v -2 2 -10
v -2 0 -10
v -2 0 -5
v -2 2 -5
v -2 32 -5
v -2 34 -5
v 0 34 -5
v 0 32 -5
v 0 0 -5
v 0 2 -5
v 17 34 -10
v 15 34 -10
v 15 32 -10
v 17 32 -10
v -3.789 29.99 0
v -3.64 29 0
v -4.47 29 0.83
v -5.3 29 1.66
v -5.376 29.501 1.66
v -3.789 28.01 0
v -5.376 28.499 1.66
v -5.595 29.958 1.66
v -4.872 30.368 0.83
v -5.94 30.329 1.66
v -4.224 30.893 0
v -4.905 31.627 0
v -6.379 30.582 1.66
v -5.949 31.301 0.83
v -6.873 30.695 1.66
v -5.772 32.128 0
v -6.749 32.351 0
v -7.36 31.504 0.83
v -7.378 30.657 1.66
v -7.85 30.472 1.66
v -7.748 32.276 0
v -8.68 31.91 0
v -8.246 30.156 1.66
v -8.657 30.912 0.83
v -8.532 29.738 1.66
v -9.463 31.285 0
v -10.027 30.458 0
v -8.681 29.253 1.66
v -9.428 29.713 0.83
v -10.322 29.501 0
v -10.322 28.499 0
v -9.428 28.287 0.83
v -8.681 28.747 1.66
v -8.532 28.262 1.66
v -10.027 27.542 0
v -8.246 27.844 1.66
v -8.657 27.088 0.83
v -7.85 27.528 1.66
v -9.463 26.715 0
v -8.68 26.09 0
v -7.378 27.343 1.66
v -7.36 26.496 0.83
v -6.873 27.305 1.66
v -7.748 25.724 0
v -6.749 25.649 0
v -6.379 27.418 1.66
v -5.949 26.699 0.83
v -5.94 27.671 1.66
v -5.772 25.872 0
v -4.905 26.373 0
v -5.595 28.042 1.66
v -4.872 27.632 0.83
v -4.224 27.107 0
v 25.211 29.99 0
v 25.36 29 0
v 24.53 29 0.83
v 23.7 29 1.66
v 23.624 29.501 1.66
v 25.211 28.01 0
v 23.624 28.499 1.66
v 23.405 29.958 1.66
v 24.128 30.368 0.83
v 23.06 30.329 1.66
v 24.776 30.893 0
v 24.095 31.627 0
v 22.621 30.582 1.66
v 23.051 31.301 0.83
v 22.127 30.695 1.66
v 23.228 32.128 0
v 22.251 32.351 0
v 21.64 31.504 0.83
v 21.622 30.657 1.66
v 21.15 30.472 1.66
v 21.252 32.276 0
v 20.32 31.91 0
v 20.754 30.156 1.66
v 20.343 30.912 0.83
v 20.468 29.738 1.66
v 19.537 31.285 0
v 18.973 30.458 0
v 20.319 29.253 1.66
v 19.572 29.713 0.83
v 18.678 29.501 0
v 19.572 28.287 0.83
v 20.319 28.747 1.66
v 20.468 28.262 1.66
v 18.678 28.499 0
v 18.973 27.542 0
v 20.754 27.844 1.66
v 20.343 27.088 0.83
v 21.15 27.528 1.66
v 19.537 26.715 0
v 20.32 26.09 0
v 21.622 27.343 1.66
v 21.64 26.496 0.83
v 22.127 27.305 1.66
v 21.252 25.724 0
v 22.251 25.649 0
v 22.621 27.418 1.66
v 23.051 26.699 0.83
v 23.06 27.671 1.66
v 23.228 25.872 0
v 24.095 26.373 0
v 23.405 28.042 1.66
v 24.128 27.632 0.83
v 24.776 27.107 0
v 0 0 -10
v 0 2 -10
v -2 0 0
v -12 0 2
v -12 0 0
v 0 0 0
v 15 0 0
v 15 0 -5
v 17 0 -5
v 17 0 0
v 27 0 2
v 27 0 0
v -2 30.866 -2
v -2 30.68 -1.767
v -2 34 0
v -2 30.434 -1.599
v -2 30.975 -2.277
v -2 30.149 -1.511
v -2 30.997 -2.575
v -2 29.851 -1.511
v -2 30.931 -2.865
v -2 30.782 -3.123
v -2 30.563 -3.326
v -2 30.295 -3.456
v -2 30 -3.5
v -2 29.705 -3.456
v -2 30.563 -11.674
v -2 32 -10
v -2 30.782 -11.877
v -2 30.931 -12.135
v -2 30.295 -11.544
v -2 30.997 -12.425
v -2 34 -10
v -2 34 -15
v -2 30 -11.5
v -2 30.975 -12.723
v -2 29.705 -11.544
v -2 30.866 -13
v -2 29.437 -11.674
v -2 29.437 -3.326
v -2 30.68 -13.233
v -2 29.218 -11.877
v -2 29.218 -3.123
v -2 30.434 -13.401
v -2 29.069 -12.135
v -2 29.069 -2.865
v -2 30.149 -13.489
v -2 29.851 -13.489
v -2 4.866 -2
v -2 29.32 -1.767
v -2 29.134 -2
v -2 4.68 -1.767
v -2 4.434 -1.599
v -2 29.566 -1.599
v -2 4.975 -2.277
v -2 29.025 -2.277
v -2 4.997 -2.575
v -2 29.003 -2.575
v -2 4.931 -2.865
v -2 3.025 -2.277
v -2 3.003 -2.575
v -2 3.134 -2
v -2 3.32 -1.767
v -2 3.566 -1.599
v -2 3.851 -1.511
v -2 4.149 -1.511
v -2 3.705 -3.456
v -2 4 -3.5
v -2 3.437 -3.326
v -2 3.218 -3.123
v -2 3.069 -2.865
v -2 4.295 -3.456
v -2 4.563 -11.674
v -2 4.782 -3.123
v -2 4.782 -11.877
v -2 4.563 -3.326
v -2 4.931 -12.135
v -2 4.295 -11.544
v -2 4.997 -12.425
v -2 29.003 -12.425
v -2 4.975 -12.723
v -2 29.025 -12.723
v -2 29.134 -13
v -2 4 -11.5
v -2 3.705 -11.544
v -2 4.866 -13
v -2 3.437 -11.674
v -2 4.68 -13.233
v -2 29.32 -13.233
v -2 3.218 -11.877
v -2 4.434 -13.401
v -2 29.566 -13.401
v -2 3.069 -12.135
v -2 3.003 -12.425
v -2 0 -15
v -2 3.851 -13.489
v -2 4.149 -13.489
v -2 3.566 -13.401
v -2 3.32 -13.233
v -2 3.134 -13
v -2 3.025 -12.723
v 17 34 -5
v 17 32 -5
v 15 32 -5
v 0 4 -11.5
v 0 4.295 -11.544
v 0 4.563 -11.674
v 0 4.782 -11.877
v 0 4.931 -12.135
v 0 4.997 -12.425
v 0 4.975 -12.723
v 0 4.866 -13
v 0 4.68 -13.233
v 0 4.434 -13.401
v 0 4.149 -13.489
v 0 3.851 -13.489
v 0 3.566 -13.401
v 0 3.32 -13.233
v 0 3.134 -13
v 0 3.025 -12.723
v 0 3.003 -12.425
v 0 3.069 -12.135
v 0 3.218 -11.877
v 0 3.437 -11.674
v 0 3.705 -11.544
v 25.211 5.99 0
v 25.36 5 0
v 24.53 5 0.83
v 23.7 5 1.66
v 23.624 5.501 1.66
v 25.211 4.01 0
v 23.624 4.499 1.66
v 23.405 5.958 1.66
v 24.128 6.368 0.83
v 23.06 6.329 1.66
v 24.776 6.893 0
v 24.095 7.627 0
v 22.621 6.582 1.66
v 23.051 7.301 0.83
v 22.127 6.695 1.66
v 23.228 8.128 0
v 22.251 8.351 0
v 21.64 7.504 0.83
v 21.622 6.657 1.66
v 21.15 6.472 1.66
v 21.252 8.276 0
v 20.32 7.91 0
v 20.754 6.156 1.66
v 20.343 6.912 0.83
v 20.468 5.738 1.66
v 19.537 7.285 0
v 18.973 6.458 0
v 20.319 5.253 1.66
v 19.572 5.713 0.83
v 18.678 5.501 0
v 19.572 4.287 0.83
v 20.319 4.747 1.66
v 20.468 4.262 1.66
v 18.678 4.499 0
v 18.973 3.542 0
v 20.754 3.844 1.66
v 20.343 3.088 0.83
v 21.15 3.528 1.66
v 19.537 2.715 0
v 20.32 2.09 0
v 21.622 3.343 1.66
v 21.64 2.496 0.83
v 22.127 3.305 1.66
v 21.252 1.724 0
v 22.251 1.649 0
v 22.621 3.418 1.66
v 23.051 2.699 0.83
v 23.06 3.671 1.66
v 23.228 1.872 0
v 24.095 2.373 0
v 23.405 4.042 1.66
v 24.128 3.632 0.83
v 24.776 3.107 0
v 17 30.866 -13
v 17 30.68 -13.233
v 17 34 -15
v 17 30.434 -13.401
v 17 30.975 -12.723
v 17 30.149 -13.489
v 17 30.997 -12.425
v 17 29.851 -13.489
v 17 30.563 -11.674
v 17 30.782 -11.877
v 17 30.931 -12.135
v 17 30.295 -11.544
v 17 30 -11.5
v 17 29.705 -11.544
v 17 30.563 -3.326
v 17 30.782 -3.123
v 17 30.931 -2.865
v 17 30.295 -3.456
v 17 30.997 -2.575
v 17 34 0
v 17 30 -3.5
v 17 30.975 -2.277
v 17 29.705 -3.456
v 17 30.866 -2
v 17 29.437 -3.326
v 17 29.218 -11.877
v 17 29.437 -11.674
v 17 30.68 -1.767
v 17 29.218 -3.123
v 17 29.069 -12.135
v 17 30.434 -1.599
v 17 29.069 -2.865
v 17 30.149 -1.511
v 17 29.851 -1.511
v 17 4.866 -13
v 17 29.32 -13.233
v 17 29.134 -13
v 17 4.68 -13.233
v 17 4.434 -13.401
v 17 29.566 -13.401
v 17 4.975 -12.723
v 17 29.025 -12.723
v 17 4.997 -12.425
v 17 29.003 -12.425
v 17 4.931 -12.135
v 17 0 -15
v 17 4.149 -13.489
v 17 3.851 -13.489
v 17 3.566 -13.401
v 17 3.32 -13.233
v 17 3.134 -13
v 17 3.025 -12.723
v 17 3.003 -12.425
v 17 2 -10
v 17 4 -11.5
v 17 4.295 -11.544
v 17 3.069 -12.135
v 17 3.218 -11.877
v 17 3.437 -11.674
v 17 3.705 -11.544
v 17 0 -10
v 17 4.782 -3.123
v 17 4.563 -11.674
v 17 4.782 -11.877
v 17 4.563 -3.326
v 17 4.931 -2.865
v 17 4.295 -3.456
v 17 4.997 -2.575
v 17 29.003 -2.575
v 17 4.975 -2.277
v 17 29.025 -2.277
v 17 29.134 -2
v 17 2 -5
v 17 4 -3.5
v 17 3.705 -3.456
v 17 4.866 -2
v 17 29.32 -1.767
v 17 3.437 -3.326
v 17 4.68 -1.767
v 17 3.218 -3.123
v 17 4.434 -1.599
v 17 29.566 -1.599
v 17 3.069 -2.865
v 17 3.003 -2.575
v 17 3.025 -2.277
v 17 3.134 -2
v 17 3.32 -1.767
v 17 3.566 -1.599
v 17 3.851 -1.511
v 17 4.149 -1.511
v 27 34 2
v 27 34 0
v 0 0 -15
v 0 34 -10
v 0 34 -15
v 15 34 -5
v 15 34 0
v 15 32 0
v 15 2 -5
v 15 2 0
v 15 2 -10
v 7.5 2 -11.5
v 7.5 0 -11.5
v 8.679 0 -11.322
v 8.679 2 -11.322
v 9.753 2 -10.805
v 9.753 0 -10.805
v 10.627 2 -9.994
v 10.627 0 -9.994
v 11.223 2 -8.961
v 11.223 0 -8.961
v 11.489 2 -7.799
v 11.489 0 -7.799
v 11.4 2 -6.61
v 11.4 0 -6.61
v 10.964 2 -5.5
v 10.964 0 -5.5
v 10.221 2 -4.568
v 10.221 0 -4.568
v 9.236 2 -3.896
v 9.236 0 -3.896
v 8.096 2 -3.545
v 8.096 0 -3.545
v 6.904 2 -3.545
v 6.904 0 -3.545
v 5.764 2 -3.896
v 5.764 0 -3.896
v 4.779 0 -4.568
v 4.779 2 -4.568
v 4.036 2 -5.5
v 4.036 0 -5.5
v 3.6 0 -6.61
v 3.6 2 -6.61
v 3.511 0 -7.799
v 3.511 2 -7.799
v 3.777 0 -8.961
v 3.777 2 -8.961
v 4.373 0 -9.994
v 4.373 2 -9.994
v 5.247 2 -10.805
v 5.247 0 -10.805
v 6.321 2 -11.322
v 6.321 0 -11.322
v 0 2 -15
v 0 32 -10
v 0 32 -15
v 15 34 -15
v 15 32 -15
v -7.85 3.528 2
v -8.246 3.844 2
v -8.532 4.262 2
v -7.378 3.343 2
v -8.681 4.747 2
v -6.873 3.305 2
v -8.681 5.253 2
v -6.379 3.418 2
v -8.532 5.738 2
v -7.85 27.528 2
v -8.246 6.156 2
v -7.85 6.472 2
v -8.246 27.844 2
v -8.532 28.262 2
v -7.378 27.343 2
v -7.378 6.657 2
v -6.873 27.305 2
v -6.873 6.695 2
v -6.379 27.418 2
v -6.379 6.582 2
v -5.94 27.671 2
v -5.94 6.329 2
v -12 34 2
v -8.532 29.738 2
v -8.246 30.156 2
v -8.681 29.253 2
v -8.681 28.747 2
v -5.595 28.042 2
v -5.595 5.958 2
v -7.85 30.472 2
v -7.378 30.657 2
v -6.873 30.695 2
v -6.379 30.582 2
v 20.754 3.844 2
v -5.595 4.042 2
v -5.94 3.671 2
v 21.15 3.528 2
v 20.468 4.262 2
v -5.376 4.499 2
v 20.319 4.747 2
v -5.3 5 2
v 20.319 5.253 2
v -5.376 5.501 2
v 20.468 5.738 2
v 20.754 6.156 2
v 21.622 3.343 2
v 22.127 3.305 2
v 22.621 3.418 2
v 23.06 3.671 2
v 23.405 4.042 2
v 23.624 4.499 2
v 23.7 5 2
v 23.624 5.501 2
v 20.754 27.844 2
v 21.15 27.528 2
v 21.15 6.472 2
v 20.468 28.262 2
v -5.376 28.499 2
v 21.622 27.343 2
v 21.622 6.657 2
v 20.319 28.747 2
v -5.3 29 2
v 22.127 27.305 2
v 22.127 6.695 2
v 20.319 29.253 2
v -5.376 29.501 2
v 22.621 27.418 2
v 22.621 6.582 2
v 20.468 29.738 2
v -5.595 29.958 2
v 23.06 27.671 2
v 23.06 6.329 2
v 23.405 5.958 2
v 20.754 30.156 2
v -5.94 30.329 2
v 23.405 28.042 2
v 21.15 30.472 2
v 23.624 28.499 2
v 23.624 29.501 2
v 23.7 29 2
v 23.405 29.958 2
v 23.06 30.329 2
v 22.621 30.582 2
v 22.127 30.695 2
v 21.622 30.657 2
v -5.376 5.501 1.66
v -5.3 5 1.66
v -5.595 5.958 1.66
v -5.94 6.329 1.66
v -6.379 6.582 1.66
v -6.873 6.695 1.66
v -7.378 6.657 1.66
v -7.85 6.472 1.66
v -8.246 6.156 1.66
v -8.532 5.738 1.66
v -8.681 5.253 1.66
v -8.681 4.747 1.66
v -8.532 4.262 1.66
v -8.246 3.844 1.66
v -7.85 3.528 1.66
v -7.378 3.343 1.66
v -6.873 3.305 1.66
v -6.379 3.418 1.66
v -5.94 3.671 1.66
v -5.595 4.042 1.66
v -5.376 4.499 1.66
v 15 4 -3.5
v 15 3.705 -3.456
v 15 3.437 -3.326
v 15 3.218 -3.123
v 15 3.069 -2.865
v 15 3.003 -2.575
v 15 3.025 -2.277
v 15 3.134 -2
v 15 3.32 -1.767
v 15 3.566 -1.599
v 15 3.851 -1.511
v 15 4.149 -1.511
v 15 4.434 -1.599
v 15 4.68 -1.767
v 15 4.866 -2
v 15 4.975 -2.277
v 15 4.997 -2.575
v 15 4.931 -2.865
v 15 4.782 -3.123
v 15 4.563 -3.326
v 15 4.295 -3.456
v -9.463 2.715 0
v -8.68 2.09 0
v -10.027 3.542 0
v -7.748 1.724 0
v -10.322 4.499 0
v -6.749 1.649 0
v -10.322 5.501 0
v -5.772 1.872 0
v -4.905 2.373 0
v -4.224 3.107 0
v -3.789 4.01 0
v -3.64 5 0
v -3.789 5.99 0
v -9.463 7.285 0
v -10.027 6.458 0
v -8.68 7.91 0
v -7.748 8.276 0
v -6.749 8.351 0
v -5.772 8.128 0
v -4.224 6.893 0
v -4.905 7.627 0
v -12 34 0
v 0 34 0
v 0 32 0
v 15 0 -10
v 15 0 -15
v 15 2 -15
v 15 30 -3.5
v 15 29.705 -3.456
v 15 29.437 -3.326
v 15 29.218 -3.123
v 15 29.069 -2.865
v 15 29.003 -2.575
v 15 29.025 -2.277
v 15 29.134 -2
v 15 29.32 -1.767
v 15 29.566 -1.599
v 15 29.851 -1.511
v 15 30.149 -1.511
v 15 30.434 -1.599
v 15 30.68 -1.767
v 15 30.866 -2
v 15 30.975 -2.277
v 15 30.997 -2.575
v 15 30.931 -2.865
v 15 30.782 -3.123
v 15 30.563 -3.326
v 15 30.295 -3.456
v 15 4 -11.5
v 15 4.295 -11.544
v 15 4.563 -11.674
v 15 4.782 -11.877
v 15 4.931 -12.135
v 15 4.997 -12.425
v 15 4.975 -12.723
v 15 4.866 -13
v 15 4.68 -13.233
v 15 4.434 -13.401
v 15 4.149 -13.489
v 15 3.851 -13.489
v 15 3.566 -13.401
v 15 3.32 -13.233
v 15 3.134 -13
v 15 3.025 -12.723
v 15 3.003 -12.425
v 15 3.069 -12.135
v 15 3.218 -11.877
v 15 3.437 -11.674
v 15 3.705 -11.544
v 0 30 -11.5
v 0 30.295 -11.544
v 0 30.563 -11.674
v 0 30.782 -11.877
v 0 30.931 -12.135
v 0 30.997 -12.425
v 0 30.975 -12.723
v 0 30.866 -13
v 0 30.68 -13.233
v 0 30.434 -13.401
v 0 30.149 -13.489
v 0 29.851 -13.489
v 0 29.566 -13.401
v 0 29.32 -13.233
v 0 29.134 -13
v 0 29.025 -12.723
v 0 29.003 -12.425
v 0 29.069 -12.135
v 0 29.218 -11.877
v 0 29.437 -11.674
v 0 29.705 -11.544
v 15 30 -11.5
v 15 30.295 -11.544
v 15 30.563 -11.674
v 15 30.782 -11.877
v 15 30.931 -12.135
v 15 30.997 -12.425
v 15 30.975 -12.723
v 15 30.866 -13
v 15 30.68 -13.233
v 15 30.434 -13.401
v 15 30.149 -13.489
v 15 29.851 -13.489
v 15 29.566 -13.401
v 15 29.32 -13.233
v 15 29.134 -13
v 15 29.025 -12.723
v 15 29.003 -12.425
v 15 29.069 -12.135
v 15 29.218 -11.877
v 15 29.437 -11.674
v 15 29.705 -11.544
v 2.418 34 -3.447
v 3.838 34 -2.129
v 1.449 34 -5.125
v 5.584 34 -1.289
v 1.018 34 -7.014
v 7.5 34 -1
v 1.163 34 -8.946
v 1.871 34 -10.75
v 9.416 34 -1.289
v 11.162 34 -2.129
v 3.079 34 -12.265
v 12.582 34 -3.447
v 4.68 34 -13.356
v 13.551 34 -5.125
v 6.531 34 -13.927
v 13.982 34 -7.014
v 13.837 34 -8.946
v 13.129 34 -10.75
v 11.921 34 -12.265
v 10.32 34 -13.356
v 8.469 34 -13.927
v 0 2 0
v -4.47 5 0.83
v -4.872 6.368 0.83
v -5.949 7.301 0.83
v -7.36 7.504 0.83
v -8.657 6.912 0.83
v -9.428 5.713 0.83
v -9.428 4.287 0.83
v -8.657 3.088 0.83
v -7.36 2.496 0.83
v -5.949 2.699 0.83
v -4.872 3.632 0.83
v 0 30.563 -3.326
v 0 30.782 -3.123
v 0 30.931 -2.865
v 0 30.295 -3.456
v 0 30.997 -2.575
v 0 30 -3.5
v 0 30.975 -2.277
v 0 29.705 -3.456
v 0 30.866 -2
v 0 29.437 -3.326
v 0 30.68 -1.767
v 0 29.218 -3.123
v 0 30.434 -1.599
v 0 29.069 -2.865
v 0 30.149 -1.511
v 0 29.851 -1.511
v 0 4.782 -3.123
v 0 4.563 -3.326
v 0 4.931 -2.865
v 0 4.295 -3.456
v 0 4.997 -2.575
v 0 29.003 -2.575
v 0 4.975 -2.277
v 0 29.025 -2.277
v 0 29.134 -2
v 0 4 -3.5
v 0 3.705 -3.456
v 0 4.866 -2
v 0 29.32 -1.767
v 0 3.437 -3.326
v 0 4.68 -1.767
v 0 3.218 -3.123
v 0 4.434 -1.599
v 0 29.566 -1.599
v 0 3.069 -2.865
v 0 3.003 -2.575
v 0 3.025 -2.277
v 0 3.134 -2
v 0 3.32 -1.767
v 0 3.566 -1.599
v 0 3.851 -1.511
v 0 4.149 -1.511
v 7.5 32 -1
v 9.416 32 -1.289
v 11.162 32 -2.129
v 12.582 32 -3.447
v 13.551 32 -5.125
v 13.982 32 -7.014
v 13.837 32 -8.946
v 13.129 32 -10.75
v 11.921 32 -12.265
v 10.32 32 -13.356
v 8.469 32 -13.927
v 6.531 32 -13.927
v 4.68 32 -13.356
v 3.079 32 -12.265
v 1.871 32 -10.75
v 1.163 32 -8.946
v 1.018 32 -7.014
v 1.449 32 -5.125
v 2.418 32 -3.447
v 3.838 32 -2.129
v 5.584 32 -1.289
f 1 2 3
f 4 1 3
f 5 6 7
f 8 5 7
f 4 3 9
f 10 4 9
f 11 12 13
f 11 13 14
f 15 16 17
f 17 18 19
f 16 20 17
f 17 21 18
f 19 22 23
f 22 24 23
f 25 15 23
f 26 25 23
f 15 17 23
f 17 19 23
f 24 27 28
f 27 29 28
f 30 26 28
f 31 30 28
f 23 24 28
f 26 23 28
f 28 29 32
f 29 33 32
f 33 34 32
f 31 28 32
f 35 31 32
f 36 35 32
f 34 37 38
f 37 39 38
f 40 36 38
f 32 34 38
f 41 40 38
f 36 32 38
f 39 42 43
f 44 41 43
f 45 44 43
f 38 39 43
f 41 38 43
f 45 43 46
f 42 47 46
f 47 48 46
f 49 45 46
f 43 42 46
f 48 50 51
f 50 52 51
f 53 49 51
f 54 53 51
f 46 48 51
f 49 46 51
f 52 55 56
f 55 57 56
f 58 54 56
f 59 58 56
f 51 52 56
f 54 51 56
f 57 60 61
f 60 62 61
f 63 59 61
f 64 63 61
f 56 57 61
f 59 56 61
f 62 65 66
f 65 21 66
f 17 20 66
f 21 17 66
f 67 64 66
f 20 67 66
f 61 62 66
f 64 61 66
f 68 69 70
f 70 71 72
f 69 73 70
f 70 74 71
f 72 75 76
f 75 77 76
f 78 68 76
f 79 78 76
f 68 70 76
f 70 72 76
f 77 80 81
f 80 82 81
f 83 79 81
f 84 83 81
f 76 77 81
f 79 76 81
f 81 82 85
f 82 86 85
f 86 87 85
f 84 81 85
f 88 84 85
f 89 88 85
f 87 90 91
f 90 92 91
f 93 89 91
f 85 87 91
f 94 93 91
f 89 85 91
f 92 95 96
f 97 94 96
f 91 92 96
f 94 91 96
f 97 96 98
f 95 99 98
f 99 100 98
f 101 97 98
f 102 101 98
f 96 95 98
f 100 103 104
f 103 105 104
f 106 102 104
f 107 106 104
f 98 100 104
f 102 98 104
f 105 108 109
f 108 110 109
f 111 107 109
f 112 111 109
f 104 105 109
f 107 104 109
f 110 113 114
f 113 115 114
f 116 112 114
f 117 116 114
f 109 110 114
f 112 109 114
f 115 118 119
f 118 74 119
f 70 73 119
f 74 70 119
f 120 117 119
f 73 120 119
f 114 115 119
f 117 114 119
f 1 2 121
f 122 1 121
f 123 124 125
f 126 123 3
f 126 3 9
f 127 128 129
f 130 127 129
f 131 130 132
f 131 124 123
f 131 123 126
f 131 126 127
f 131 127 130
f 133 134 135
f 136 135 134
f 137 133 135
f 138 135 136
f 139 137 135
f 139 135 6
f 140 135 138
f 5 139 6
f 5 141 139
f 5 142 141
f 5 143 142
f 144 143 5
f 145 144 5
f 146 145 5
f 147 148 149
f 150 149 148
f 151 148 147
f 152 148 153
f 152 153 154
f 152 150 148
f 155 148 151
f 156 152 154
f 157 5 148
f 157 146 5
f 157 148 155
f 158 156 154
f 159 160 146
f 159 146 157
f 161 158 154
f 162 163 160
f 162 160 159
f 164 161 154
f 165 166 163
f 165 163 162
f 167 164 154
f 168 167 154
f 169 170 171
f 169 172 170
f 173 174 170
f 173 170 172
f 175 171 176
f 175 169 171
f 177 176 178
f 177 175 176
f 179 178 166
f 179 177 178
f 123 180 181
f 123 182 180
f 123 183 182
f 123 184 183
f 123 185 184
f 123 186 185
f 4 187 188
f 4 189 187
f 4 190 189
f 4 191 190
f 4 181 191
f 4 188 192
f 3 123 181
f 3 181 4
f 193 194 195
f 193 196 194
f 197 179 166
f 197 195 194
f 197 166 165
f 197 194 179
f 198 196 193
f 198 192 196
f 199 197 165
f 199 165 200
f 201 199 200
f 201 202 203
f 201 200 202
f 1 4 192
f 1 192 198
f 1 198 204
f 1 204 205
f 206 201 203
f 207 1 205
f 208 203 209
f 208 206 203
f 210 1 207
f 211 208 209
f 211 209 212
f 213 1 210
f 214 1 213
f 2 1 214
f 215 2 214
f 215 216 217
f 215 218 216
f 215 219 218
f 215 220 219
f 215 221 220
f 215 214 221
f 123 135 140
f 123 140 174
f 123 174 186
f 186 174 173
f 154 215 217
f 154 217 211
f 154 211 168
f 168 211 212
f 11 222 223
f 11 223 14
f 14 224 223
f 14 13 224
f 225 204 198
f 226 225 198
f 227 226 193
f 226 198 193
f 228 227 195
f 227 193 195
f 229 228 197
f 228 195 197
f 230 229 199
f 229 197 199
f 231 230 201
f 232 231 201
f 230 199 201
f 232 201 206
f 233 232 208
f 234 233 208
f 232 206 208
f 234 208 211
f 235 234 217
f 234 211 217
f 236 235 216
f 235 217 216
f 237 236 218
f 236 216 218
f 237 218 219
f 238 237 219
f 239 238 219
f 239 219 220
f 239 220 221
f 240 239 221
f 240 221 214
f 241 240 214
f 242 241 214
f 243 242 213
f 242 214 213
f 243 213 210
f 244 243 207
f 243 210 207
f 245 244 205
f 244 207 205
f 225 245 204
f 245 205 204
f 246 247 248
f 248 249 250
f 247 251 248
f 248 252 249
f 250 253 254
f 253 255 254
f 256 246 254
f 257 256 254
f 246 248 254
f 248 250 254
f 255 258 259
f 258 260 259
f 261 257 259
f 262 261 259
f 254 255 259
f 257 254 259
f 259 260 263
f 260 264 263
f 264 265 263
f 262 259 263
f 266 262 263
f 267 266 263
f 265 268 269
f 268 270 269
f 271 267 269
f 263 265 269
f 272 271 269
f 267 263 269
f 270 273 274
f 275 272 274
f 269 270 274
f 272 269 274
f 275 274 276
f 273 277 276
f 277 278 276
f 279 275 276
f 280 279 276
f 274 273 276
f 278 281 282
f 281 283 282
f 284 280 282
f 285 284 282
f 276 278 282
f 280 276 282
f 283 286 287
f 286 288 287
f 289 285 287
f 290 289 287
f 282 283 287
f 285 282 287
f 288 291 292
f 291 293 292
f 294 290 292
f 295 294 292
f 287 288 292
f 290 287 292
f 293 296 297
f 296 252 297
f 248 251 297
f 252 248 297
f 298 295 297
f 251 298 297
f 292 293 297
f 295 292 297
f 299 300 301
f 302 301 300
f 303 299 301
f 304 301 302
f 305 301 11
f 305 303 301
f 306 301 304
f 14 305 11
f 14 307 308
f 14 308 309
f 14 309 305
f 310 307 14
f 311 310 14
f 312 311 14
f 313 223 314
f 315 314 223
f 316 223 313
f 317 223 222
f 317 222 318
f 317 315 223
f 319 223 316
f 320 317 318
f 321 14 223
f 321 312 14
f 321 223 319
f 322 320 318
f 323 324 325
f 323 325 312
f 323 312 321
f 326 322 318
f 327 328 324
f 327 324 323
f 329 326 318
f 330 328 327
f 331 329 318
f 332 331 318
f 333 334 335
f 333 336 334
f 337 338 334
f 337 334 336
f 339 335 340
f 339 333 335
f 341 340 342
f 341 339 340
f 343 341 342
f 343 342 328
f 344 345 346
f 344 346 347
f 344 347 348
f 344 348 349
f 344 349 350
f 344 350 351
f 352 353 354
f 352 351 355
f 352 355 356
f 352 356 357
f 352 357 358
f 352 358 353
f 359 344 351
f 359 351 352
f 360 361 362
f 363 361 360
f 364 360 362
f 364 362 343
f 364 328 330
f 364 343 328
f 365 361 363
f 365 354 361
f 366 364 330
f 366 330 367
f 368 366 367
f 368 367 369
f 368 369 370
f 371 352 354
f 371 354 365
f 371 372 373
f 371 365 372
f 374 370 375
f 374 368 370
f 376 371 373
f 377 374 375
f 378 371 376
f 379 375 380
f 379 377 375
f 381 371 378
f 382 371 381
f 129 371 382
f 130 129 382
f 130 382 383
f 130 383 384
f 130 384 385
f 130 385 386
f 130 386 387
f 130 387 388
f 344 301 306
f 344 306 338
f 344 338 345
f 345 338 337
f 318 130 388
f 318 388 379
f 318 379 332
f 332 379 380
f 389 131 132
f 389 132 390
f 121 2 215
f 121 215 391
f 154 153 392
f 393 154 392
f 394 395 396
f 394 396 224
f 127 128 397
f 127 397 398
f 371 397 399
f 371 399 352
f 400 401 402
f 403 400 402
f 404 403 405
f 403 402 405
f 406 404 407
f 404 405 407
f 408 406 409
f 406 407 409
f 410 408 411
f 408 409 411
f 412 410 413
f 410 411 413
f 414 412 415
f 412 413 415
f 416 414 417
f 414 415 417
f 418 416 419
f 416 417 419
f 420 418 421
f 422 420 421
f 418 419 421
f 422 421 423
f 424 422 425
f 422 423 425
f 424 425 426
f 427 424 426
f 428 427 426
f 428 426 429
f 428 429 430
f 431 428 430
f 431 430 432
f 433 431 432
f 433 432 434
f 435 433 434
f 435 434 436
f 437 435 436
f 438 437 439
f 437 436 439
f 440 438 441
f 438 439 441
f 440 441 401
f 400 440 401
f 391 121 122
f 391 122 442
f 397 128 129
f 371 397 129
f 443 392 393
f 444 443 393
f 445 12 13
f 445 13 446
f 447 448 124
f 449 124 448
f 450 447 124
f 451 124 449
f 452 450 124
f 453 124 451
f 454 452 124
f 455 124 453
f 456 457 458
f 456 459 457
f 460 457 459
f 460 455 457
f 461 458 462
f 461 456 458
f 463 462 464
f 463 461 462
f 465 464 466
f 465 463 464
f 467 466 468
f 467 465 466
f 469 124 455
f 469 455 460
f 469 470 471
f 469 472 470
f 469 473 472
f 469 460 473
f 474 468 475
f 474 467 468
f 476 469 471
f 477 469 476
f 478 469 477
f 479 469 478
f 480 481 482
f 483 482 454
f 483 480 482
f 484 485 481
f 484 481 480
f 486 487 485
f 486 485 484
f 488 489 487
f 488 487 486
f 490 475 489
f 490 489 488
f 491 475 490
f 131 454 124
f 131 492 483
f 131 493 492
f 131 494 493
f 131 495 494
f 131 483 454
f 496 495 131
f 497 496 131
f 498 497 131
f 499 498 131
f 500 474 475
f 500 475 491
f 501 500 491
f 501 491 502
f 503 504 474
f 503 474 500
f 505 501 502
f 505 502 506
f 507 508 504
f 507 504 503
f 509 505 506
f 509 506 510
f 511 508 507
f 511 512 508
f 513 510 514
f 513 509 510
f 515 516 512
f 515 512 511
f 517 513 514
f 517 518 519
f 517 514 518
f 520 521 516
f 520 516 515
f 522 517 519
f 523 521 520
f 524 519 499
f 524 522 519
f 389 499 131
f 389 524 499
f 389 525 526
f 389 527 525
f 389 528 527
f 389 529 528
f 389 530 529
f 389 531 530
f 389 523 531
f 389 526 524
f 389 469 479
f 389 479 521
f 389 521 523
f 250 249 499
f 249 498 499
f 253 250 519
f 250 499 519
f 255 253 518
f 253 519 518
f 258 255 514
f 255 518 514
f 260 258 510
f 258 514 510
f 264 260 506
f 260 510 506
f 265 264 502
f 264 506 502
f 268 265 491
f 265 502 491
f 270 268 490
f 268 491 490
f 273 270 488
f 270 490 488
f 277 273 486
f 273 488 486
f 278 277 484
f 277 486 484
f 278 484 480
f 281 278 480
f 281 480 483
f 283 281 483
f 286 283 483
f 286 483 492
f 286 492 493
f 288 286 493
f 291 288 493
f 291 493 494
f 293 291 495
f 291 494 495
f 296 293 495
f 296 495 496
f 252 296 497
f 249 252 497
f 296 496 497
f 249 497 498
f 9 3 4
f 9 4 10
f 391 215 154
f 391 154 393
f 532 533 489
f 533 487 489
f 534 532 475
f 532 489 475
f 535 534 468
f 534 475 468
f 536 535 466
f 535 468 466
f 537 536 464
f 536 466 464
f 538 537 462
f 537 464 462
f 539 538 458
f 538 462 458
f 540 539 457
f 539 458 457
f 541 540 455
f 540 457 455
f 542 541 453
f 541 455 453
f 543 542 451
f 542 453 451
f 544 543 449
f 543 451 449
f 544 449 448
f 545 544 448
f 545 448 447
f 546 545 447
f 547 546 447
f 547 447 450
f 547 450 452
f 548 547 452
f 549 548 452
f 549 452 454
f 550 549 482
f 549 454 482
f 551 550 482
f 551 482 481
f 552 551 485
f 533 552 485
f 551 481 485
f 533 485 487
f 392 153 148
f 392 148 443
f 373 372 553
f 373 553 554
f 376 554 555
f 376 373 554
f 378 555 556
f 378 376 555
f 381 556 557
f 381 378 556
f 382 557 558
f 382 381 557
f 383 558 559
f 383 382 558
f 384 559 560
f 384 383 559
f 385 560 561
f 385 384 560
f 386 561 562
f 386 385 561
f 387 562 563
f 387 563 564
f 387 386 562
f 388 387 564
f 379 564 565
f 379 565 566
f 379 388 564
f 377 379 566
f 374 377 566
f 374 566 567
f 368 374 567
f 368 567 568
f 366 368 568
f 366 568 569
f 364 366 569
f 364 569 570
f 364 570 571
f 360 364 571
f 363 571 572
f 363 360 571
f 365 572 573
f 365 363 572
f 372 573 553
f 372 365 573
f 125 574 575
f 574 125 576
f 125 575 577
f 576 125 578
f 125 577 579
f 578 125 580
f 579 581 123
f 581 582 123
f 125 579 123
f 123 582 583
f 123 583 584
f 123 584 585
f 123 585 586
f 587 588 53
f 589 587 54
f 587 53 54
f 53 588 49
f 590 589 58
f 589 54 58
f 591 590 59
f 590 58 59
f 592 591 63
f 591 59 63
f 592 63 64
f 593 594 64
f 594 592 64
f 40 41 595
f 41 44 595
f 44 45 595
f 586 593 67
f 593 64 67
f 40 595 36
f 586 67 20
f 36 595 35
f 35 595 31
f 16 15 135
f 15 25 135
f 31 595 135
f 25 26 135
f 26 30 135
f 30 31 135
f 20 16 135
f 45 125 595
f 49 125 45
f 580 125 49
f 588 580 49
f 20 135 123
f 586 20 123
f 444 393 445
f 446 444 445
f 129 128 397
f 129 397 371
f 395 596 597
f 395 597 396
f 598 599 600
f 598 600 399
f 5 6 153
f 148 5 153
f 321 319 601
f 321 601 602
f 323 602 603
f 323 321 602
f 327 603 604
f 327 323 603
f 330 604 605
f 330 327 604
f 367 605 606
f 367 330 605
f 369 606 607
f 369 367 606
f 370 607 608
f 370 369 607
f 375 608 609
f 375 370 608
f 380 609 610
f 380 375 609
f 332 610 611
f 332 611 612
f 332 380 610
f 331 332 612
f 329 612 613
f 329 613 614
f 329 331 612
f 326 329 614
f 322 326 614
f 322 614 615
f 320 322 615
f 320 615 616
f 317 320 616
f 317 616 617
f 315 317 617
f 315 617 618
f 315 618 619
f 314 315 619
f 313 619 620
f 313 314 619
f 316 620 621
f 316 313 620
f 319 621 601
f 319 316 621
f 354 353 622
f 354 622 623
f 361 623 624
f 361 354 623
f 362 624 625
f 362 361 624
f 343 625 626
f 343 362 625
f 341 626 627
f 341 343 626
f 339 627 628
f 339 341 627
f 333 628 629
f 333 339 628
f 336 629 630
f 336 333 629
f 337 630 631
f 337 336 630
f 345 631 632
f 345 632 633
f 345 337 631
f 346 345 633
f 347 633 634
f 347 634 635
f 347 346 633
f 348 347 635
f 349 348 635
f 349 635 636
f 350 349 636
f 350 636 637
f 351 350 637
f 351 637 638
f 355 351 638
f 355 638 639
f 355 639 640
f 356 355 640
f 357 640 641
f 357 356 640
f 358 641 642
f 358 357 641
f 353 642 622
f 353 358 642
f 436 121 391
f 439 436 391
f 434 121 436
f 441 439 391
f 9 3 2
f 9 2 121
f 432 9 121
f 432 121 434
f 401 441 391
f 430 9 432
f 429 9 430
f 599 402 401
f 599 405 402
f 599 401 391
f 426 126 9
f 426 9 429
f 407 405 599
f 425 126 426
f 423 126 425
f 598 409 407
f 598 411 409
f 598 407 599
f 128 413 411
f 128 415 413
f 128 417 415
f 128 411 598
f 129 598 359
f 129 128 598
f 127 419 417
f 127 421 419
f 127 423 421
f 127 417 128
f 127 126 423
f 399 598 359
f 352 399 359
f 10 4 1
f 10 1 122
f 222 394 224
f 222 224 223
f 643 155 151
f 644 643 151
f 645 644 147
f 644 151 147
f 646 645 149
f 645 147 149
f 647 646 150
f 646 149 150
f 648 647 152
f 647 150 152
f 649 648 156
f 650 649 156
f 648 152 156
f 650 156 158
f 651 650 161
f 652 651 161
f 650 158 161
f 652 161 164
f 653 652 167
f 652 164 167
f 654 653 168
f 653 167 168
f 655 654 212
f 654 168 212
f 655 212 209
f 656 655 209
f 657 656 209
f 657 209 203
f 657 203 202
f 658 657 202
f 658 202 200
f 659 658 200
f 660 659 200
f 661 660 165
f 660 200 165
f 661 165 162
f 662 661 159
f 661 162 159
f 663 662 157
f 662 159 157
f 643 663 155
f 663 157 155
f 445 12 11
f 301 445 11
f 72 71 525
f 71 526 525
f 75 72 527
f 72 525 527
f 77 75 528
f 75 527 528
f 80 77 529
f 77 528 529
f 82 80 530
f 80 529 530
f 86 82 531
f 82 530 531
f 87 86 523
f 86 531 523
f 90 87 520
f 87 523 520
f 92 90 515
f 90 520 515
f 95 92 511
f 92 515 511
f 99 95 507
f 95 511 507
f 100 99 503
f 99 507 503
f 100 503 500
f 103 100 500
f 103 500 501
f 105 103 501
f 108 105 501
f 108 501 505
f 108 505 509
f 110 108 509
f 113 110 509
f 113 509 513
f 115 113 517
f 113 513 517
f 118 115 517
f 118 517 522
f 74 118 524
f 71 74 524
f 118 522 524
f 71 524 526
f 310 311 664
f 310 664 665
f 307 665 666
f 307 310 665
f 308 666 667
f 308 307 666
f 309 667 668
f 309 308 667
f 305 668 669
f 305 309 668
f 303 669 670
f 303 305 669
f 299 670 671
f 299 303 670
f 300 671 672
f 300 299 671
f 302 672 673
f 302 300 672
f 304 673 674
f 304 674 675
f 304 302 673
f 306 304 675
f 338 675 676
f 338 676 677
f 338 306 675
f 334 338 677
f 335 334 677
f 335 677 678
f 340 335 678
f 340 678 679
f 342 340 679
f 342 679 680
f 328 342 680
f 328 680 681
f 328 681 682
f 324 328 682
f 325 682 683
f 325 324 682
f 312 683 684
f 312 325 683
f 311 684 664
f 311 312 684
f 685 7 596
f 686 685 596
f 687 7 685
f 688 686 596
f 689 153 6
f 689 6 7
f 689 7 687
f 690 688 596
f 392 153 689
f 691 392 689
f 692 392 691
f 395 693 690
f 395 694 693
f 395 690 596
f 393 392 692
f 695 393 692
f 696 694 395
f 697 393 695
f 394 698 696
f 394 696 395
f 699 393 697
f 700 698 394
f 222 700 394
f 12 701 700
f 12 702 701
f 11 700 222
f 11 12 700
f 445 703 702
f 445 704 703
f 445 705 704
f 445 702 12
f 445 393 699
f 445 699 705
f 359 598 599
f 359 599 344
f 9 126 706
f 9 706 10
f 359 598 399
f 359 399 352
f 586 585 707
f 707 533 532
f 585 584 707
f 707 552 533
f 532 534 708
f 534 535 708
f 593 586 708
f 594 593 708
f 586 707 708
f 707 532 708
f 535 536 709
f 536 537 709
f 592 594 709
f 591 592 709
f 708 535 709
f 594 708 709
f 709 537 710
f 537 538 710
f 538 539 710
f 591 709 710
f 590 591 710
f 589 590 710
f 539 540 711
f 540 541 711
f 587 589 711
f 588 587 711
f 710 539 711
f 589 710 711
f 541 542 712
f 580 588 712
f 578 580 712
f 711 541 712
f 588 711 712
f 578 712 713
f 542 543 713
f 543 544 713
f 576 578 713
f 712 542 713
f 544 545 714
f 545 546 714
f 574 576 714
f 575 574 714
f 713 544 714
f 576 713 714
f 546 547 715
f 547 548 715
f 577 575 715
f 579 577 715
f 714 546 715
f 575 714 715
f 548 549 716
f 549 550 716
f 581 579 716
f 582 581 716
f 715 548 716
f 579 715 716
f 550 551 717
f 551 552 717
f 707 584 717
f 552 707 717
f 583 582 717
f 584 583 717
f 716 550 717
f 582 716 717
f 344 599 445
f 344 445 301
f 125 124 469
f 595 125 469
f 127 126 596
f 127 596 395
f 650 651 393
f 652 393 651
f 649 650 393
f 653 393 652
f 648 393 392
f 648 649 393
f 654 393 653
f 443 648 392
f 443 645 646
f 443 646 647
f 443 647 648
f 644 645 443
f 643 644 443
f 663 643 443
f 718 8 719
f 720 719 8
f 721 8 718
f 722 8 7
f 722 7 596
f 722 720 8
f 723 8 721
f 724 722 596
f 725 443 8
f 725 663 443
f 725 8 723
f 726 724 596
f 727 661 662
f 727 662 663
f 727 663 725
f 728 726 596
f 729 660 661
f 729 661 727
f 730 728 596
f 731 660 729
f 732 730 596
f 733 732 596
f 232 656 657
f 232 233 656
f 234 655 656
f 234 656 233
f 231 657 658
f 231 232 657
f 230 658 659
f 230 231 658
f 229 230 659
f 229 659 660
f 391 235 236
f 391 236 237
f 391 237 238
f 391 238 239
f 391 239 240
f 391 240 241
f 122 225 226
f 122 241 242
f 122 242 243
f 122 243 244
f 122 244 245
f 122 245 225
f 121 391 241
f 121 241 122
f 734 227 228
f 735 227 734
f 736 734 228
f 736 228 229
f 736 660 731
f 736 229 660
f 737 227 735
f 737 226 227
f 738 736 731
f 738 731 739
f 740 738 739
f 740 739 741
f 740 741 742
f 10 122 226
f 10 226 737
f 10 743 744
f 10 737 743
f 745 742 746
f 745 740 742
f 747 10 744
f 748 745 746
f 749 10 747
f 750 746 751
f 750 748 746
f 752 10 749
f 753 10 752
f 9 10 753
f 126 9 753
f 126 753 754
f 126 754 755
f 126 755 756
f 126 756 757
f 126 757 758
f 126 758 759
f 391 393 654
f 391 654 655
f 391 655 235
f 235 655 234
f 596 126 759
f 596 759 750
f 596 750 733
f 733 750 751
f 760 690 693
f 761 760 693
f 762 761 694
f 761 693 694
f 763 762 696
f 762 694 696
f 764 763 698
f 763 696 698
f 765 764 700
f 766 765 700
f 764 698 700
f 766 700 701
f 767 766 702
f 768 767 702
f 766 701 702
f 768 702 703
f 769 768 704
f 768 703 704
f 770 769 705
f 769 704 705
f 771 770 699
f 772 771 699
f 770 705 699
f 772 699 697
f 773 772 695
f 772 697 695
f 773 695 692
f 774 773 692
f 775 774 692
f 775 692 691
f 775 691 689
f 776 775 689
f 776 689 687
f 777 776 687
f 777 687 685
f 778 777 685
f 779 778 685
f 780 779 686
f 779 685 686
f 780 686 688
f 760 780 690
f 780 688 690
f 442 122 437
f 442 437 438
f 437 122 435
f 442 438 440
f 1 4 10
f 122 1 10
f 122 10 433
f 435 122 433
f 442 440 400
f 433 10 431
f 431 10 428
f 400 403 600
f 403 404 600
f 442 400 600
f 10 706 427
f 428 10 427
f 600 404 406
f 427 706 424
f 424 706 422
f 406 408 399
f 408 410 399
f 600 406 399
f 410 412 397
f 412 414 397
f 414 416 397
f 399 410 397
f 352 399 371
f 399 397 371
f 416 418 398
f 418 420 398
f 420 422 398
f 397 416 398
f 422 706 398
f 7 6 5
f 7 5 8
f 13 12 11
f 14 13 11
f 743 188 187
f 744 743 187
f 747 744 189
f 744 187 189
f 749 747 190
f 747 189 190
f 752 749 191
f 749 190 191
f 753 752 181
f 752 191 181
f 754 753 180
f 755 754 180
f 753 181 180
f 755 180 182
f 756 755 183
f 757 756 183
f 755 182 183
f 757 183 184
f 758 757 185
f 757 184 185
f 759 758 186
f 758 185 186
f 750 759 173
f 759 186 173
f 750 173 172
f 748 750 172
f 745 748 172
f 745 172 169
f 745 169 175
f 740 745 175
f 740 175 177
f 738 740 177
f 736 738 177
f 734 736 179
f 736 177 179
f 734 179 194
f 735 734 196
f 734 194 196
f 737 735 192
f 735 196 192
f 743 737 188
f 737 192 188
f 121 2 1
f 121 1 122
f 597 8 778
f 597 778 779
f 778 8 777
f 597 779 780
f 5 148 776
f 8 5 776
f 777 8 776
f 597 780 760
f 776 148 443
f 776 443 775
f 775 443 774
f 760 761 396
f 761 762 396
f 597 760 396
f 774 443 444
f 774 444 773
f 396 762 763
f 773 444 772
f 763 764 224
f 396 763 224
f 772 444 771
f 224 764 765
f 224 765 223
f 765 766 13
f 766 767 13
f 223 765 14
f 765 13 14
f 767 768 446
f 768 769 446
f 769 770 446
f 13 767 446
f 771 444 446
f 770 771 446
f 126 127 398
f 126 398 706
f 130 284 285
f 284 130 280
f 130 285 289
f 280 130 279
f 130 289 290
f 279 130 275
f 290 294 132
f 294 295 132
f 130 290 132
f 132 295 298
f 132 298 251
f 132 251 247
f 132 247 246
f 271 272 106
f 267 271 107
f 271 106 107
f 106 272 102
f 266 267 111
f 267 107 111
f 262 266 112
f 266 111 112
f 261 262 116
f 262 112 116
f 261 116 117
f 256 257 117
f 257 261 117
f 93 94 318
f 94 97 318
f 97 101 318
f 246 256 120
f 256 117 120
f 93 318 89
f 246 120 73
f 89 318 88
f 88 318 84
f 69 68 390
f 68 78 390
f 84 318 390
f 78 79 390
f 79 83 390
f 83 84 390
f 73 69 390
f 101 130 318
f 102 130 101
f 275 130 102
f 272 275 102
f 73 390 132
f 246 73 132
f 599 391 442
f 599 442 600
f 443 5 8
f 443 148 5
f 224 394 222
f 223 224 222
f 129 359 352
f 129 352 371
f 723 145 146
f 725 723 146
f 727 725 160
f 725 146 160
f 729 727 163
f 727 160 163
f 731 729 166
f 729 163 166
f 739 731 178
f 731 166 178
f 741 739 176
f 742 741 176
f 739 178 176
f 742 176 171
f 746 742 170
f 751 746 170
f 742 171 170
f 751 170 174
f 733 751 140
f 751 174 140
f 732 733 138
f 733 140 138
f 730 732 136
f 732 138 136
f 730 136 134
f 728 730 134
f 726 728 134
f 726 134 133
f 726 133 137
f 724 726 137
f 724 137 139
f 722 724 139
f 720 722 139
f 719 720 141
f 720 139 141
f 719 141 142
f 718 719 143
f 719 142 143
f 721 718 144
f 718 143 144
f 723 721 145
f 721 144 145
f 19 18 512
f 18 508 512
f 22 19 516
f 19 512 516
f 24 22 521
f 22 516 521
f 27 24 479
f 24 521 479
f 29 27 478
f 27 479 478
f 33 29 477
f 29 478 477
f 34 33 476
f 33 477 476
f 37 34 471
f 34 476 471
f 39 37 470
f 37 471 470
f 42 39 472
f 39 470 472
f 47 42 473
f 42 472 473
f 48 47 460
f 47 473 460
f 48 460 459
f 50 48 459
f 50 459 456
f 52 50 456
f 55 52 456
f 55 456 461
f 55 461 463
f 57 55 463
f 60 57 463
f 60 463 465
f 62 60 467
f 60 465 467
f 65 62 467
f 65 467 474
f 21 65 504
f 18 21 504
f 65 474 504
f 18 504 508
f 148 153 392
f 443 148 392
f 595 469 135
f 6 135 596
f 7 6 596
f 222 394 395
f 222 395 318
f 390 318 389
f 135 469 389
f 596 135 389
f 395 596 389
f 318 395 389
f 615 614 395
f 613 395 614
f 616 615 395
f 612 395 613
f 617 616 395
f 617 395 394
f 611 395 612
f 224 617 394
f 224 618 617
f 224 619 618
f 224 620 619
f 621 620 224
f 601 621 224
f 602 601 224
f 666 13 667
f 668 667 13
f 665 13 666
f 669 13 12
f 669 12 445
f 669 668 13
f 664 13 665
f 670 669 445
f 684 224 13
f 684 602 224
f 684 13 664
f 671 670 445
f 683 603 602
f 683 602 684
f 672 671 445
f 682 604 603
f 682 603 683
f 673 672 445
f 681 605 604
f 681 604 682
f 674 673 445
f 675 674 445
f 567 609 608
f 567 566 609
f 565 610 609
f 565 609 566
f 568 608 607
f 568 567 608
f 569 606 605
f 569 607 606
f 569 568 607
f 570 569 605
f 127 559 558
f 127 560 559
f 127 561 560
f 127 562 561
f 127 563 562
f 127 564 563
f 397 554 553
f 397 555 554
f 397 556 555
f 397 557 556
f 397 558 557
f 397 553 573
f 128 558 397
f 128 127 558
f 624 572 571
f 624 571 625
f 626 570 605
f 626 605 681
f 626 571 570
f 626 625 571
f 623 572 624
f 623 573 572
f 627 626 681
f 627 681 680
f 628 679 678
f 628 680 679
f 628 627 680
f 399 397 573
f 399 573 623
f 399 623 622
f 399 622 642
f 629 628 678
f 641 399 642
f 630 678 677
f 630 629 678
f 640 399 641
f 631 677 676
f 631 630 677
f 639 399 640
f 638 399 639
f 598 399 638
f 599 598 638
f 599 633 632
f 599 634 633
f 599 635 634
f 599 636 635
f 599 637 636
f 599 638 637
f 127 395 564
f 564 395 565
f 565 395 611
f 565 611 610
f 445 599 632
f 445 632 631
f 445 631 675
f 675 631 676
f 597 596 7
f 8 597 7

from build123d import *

# Parameters (mm, degrees)
BOSS_EXTRUDE1_DEPTH                                  = 34
SKETCH2_W                                            = 10
SKETCH2_H                                            = 34
BOSS_EXTRUDE2_DEPTH                                  = 2
CSK_FOR_M3_HEX_SOCKET_COUNTERSUNK_CAP_SC_D           = 3.4
CSK_FOR_M3_HEX_SOCKET_COUNTERSUNK_CAP_SC_DEPTH       = 30
CSK_FOR_M3_HEX_SOCKET_COUNTERSUNK_CAP_SC_CSINK_D     = 6.72
CSK_FOR_M3_HEX_SOCKET_COUNTERSUNK_CAP_SC_CSINK_ANGLE = 90
CSK_FOR_M3_HEX_SOCKET_COUNTERSUNK_CAP_SC_TIP         = 1.021463052
SKETCH6_W                                            = 2
SKETCH6_H                                            = 5
CUT_EXTRUDE3_DEPTH                                   = 2
SKETCH6_5_R                                          = 4
BOSS_EXTRUDE5_DEPTH                                  = 2
CUT_EXTRUDE6_DEPTH                                   = 2
SKETCH9_3_R                                          = 6.5
BOSS_EXTRUDE7_DEPTH                                  = 2
SKETCH10_R                                           = 1
CUT_EXTRUDE7_DEPTH                                   = 2


with BuildPart() as part:
    # Sketch1 → Boss-Extrude1 (new body)
    with BuildSketch(Plane(origin=(0, 0, 0), x_dir=(1, 0, 0), z_dir=(0, 1, 0))):
        Polygon((0, 15), (0, 0), (15, 0), (15, 15), (17, 15), (17, -2), (-2, -2), (-2, 15), align=None)
    extrude(amount=BOSS_EXTRUDE1_DEPTH)

    # Sketch2 → Boss-Extrude2 (add)
    with BuildSketch(Plane.XY.offset(2)):
        with Locations((-7, 17)):
            Rectangle(SKETCH2_W, SKETCH2_H)
        with Locations((22, 17)):
            Rectangle(SKETCH2_W, SKETCH2_H)
    extrude(amount=-BOSS_EXTRUDE2_DEPTH)

    # CSK for M3 Hex Socket Countersunk Cap Screw1
    with Locations(Plane(origin=(0, 0, 0), x_dir=(-1, 0, 0), z_dir=(0, 0, -1))):
        with Locations((7, 29), (7, 5), (-22, 5), (-22, 29)):
            CounterSinkHole(CSK_FOR_M3_HEX_SOCKET_COUNTERSUNK_CAP_SC_D / 2, CSK_FOR_M3_HEX_SOCKET_COUNTERSUNK_CAP_SC_CSINK_D / 2, depth=CSK_FOR_M3_HEX_SOCKET_COUNTERSUNK_CAP_SC_DEPTH, counter_sink_angle=CSK_FOR_M3_HEX_SOCKET_COUNTERSUNK_CAP_SC_CSINK_ANGLE)
            with Locations((0, 0, -(CSK_FOR_M3_HEX_SOCKET_COUNTERSUNK_CAP_SC_DEPTH + CSK_FOR_M3_HEX_SOCKET_COUNTERSUNK_CAP_SC_TIP / 2))):  # 118° drill point
                Cone(0, CSK_FOR_M3_HEX_SOCKET_COUNTERSUNK_CAP_SC_D / 2, CSK_FOR_M3_HEX_SOCKET_COUNTERSUNK_CAP_SC_TIP, mode=Mode.SUBTRACT)

    # Sketch6 → Cut-Extrude3 (cut)
    with BuildSketch(Plane.XZ):
        with Locations((-1, -7.5)):
            Rectangle(SKETCH6_W, SKETCH6_H)
        with Locations((16, -7.5)):
            Rectangle(SKETCH6_W, SKETCH6_H)
    extrude(amount=-CUT_EXTRUDE3_DEPTH, mode=Mode.SUBTRACT)

    # Sketch9 → Cut-Extrude6 (cut)
    with BuildSketch(Plane(origin=(0, 34, 0), x_dir=(1, 0, 0), z_dir=(0, 1, 0))):
        Polygon((-2, 10), (-2, 5), (0, 5), (0, 0), (15, 0), (15, 5), (17, 5), (17, 10), (15, 10), (15, 15), (0, 15), (0, 10), align=None)
    extrude(amount=-CUT_EXTRUDE6_DEPTH, mode=Mode.SUBTRACT)

    # Sketch10 → Cut-Extrude7 (cut)
    with BuildSketch(Plane.ZY.offset(2)):
        with Locations((-12.5, 4)):
            Circle(SKETCH10_R)
        with Locations((-12.5, 30)):
            Circle(SKETCH10_R)
        with Locations((-2.5, 30)):
            Circle(SKETCH10_R)
        with Locations((-2.5, 4)):
            Circle(SKETCH10_R)
    cut_extrude7 = extrude(amount=-CUT_EXTRUDE7_DEPTH, mode=Mode.SUBTRACT)

    # Mirror2: Cut-Extrude7 across plane
    add(cut_extrude7.mirror(Plane(origin=(7.5, 0, 0), x_dir=(0, 0, 1), z_dir=(1, 0, 0))), mode=Mode.SUBTRACT)


with BuildPart() as body_2:
    # Sketch6<5> → Boss-Extrude5 (new body)
    with BuildSketch(Plane.XZ):
        Polygon((15, 0), (0, 0), (0, -5), (-2, -5), (-2, -10), (0, -10), (0, -15), (15, -15), (15, -10), (17, -10), (17, -5), (15, -5), align=None)
        with Locations((7.5, -7.5)):
            Circle(SKETCH6_5_R, mode=Mode.SUBTRACT)
    extrude(amount=-BOSS_EXTRUDE5_DEPTH)


with BuildPart() as body_3:
    # Sketch9<3> → Boss-Extrude7 (new body)
    with BuildSketch(Plane(origin=(0, 34, 0), x_dir=(1, 0, 0), z_dir=(0, 1, 0))):
        Polygon((-2, 10), (-2, 5), (0, 5), (0, 0), (15, 0), (15, 5), (17, 5), (17, 10), (15, 10), (15, 15), (0, 15), (0, 10), align=None)
        with Locations((7.5, 7.5)):
            Circle(SKETCH9_3_R, mode=Mode.SUBTRACT)
    extrude(amount=-BOSS_EXTRUDE7_DEPTH)


solid = Compound([part.part, body_2.part, body_3.part])
